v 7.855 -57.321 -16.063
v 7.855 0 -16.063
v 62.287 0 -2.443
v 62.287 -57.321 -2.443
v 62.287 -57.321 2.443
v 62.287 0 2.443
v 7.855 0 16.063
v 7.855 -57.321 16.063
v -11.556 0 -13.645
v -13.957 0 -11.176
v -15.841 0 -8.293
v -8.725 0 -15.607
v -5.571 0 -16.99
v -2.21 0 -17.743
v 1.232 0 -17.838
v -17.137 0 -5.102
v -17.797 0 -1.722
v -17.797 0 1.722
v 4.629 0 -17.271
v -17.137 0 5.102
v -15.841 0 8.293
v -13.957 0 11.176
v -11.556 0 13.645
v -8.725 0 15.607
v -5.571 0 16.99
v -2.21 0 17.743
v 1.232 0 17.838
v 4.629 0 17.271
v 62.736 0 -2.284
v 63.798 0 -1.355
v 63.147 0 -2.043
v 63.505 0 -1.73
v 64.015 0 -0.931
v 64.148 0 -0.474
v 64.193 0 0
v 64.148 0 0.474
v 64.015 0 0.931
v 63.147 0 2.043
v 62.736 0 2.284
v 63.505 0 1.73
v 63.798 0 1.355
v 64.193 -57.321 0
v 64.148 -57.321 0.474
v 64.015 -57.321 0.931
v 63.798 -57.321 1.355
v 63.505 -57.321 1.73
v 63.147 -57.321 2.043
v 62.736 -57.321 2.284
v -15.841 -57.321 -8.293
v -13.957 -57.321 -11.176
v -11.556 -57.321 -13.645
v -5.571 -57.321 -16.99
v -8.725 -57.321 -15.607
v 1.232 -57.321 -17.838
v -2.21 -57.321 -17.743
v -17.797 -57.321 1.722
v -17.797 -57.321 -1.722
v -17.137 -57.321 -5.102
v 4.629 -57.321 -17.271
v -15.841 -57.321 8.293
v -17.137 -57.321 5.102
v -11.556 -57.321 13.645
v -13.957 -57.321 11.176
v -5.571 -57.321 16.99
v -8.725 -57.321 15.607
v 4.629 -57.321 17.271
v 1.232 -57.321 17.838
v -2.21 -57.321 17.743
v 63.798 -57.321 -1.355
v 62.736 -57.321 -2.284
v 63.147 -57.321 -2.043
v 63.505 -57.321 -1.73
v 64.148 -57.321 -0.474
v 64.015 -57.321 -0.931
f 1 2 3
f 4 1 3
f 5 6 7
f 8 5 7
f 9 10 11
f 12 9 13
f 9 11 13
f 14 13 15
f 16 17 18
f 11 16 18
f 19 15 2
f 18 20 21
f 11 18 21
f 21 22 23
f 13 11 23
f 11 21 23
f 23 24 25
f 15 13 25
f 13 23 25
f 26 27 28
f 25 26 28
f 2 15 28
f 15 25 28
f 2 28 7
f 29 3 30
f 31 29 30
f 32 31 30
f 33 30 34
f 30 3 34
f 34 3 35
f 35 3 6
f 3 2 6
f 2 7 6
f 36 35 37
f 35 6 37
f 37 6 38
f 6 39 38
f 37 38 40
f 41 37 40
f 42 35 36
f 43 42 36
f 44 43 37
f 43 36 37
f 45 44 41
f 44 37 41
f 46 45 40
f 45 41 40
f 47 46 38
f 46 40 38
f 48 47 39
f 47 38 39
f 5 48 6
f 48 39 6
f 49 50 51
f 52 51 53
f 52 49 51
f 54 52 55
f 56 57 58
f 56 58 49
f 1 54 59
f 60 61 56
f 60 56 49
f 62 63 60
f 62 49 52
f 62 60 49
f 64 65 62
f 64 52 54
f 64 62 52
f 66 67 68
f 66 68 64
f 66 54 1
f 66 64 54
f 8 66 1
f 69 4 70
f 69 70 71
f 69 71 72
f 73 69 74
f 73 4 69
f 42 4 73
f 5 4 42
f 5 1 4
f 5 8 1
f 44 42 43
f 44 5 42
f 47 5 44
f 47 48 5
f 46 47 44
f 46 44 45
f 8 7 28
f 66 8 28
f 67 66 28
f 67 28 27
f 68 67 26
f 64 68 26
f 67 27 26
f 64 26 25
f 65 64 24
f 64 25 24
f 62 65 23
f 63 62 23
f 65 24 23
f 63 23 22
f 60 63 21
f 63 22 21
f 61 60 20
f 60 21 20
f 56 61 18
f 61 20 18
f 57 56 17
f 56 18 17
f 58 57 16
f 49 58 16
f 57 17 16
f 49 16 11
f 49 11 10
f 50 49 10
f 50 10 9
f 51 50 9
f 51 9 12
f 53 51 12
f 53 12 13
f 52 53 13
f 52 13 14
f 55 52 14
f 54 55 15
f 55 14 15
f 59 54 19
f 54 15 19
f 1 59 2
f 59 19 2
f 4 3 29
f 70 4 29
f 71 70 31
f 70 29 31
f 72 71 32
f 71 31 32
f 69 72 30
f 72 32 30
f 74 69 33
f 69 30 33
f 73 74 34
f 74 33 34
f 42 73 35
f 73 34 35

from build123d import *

# Parameters (mm, degrees)
F1_DEPTH = 57.32141


with BuildPart() as f1:
    # F0 (on Front) → F1 (new body)
    with BuildSketch(Plane.XZ):
        with BuildLine():
            ThreePointArc((7.854603, 16.062915), (15.168325, 9.467519), (17.880493, 0))
            ThreePointArc((17.880493, 0), (15.168325, -9.467519), (7.854603, -16.062915))
            Line((7.854603, -16.062915), (62.286771, -2.442561))
            ThreePointArc((62.286771, -2.442561), (59.15771, 0), (62.286771, 2.442561))
            Line((62.286771, 2.442561), (7.854603, 16.062915))
        make_face()
        with BuildLine():
            ThreePointArc((64.193446, 0), (63.660341, 1.549315), (62.286771, 2.442561))
            ThreePointArc((62.286771, 2.442561), (59.15771, 0), (62.286771, -2.442561))
            ThreePointArc((62.286771, -2.442561), (63.660341, -1.549315), (64.193446, 0))
        make_face()
        with BuildLine():
            ThreePointArc((7.854603, -16.062915), (15.168325, -9.467519), (17.880493, 0))
            ThreePointArc((17.880493, 0), (15.168325, 9.467519), (7.854603, 16.062915))
            ThreePointArc((7.854603, 16.062915), (-17.880493, 0), (7.854603, -16.062915))
        make_face()
    extrude(amount=F1_DEPTH)


solid = f1.part
